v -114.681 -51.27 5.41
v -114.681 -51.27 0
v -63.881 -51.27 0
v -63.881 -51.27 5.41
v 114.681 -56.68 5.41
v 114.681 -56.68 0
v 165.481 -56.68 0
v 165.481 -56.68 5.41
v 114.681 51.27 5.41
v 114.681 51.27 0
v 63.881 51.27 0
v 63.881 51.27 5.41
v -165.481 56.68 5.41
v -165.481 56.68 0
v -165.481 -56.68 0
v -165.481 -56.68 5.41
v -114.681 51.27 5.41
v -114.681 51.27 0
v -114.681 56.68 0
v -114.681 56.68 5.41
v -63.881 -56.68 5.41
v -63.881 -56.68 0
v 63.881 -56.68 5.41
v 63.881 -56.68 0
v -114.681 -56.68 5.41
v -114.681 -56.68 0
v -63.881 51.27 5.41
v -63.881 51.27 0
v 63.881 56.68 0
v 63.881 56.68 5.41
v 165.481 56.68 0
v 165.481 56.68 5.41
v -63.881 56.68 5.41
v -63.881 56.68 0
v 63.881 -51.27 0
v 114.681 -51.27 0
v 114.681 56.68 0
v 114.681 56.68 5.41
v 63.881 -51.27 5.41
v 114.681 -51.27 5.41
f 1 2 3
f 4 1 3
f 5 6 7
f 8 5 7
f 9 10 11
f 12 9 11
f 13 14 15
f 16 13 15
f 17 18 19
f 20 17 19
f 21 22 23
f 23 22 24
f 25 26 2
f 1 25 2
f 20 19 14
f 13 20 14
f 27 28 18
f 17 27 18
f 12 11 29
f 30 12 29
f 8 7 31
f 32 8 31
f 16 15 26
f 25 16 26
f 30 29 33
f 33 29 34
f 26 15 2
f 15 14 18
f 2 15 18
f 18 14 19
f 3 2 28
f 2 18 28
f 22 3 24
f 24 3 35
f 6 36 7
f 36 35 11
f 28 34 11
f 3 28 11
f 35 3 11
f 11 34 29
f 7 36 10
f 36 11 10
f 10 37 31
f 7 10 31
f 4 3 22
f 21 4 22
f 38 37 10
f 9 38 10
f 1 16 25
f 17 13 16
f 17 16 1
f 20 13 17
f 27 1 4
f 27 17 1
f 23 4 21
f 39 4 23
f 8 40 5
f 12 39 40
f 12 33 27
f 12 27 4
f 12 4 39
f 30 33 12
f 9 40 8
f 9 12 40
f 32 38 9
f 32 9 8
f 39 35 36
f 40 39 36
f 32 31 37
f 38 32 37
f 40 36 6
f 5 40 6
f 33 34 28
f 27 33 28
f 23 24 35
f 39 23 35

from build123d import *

# Parameters (mm, degrees)
BOSS_EXTRUDE1_DEPTH = 5.4102


with BuildPart() as part:
    # Sketch1 → Boss-Extrude1 (new body)
    with BuildSketch(Plane.XY):
        Polygon((-165.481, 56.680227), (-165.481, 0), (165.481, 0), (165.481, 56.680227), (114.681, 56.680227), (114.681, 51.270027), (63.881, 51.270027), (63.881, 56.680227), (-63.881, 56.680227), (-63.881, 51.270027), (-114.681, 51.270027), (-114.681, 56.680227), align=None)
        Polygon((-165.481, 0), (-165.481, -56.680227), (-114.681, -56.680227), (-114.681, -51.270027), (-63.881, -51.270027), (-63.881, -56.680227), (63.881, -56.680227), (63.881, -51.270027), (114.681, -51.270027), (114.681, -56.680227), (165.481, -56.680227), (165.481, 0), align=None)
    extrude(amount=BOSS_EXTRUDE1_DEPTH)


solid = part.part
